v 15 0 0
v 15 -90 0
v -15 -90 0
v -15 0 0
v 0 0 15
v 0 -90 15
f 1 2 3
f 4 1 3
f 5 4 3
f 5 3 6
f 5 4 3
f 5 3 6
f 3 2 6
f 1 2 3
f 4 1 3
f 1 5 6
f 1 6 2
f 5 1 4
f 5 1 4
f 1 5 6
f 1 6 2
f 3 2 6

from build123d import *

# Parameters (mm, degrees)
EXTRUDE_DEPTH    = 90
EXTRUDE001_DEPTH = 90


with BuildPart() as extrude_body:
    # Sketch → Extrude (new body)
    with BuildSketch(Plane.XZ):
        Polygon((-15, 0), (0, 15), (15, 0), align=None)
    extrude(amount=EXTRUDE_DEPTH)


with BuildPart() as extrude001:
    # Sketch → Extrude001 (new body)
    with BuildSketch(Plane.XZ):
        Polygon((-15, 0), (0, 15), (15, 0), align=None)
    extrude(amount=EXTRUDE001_DEPTH)


solid = Compound([extrude_body.part, extrude001.part])
